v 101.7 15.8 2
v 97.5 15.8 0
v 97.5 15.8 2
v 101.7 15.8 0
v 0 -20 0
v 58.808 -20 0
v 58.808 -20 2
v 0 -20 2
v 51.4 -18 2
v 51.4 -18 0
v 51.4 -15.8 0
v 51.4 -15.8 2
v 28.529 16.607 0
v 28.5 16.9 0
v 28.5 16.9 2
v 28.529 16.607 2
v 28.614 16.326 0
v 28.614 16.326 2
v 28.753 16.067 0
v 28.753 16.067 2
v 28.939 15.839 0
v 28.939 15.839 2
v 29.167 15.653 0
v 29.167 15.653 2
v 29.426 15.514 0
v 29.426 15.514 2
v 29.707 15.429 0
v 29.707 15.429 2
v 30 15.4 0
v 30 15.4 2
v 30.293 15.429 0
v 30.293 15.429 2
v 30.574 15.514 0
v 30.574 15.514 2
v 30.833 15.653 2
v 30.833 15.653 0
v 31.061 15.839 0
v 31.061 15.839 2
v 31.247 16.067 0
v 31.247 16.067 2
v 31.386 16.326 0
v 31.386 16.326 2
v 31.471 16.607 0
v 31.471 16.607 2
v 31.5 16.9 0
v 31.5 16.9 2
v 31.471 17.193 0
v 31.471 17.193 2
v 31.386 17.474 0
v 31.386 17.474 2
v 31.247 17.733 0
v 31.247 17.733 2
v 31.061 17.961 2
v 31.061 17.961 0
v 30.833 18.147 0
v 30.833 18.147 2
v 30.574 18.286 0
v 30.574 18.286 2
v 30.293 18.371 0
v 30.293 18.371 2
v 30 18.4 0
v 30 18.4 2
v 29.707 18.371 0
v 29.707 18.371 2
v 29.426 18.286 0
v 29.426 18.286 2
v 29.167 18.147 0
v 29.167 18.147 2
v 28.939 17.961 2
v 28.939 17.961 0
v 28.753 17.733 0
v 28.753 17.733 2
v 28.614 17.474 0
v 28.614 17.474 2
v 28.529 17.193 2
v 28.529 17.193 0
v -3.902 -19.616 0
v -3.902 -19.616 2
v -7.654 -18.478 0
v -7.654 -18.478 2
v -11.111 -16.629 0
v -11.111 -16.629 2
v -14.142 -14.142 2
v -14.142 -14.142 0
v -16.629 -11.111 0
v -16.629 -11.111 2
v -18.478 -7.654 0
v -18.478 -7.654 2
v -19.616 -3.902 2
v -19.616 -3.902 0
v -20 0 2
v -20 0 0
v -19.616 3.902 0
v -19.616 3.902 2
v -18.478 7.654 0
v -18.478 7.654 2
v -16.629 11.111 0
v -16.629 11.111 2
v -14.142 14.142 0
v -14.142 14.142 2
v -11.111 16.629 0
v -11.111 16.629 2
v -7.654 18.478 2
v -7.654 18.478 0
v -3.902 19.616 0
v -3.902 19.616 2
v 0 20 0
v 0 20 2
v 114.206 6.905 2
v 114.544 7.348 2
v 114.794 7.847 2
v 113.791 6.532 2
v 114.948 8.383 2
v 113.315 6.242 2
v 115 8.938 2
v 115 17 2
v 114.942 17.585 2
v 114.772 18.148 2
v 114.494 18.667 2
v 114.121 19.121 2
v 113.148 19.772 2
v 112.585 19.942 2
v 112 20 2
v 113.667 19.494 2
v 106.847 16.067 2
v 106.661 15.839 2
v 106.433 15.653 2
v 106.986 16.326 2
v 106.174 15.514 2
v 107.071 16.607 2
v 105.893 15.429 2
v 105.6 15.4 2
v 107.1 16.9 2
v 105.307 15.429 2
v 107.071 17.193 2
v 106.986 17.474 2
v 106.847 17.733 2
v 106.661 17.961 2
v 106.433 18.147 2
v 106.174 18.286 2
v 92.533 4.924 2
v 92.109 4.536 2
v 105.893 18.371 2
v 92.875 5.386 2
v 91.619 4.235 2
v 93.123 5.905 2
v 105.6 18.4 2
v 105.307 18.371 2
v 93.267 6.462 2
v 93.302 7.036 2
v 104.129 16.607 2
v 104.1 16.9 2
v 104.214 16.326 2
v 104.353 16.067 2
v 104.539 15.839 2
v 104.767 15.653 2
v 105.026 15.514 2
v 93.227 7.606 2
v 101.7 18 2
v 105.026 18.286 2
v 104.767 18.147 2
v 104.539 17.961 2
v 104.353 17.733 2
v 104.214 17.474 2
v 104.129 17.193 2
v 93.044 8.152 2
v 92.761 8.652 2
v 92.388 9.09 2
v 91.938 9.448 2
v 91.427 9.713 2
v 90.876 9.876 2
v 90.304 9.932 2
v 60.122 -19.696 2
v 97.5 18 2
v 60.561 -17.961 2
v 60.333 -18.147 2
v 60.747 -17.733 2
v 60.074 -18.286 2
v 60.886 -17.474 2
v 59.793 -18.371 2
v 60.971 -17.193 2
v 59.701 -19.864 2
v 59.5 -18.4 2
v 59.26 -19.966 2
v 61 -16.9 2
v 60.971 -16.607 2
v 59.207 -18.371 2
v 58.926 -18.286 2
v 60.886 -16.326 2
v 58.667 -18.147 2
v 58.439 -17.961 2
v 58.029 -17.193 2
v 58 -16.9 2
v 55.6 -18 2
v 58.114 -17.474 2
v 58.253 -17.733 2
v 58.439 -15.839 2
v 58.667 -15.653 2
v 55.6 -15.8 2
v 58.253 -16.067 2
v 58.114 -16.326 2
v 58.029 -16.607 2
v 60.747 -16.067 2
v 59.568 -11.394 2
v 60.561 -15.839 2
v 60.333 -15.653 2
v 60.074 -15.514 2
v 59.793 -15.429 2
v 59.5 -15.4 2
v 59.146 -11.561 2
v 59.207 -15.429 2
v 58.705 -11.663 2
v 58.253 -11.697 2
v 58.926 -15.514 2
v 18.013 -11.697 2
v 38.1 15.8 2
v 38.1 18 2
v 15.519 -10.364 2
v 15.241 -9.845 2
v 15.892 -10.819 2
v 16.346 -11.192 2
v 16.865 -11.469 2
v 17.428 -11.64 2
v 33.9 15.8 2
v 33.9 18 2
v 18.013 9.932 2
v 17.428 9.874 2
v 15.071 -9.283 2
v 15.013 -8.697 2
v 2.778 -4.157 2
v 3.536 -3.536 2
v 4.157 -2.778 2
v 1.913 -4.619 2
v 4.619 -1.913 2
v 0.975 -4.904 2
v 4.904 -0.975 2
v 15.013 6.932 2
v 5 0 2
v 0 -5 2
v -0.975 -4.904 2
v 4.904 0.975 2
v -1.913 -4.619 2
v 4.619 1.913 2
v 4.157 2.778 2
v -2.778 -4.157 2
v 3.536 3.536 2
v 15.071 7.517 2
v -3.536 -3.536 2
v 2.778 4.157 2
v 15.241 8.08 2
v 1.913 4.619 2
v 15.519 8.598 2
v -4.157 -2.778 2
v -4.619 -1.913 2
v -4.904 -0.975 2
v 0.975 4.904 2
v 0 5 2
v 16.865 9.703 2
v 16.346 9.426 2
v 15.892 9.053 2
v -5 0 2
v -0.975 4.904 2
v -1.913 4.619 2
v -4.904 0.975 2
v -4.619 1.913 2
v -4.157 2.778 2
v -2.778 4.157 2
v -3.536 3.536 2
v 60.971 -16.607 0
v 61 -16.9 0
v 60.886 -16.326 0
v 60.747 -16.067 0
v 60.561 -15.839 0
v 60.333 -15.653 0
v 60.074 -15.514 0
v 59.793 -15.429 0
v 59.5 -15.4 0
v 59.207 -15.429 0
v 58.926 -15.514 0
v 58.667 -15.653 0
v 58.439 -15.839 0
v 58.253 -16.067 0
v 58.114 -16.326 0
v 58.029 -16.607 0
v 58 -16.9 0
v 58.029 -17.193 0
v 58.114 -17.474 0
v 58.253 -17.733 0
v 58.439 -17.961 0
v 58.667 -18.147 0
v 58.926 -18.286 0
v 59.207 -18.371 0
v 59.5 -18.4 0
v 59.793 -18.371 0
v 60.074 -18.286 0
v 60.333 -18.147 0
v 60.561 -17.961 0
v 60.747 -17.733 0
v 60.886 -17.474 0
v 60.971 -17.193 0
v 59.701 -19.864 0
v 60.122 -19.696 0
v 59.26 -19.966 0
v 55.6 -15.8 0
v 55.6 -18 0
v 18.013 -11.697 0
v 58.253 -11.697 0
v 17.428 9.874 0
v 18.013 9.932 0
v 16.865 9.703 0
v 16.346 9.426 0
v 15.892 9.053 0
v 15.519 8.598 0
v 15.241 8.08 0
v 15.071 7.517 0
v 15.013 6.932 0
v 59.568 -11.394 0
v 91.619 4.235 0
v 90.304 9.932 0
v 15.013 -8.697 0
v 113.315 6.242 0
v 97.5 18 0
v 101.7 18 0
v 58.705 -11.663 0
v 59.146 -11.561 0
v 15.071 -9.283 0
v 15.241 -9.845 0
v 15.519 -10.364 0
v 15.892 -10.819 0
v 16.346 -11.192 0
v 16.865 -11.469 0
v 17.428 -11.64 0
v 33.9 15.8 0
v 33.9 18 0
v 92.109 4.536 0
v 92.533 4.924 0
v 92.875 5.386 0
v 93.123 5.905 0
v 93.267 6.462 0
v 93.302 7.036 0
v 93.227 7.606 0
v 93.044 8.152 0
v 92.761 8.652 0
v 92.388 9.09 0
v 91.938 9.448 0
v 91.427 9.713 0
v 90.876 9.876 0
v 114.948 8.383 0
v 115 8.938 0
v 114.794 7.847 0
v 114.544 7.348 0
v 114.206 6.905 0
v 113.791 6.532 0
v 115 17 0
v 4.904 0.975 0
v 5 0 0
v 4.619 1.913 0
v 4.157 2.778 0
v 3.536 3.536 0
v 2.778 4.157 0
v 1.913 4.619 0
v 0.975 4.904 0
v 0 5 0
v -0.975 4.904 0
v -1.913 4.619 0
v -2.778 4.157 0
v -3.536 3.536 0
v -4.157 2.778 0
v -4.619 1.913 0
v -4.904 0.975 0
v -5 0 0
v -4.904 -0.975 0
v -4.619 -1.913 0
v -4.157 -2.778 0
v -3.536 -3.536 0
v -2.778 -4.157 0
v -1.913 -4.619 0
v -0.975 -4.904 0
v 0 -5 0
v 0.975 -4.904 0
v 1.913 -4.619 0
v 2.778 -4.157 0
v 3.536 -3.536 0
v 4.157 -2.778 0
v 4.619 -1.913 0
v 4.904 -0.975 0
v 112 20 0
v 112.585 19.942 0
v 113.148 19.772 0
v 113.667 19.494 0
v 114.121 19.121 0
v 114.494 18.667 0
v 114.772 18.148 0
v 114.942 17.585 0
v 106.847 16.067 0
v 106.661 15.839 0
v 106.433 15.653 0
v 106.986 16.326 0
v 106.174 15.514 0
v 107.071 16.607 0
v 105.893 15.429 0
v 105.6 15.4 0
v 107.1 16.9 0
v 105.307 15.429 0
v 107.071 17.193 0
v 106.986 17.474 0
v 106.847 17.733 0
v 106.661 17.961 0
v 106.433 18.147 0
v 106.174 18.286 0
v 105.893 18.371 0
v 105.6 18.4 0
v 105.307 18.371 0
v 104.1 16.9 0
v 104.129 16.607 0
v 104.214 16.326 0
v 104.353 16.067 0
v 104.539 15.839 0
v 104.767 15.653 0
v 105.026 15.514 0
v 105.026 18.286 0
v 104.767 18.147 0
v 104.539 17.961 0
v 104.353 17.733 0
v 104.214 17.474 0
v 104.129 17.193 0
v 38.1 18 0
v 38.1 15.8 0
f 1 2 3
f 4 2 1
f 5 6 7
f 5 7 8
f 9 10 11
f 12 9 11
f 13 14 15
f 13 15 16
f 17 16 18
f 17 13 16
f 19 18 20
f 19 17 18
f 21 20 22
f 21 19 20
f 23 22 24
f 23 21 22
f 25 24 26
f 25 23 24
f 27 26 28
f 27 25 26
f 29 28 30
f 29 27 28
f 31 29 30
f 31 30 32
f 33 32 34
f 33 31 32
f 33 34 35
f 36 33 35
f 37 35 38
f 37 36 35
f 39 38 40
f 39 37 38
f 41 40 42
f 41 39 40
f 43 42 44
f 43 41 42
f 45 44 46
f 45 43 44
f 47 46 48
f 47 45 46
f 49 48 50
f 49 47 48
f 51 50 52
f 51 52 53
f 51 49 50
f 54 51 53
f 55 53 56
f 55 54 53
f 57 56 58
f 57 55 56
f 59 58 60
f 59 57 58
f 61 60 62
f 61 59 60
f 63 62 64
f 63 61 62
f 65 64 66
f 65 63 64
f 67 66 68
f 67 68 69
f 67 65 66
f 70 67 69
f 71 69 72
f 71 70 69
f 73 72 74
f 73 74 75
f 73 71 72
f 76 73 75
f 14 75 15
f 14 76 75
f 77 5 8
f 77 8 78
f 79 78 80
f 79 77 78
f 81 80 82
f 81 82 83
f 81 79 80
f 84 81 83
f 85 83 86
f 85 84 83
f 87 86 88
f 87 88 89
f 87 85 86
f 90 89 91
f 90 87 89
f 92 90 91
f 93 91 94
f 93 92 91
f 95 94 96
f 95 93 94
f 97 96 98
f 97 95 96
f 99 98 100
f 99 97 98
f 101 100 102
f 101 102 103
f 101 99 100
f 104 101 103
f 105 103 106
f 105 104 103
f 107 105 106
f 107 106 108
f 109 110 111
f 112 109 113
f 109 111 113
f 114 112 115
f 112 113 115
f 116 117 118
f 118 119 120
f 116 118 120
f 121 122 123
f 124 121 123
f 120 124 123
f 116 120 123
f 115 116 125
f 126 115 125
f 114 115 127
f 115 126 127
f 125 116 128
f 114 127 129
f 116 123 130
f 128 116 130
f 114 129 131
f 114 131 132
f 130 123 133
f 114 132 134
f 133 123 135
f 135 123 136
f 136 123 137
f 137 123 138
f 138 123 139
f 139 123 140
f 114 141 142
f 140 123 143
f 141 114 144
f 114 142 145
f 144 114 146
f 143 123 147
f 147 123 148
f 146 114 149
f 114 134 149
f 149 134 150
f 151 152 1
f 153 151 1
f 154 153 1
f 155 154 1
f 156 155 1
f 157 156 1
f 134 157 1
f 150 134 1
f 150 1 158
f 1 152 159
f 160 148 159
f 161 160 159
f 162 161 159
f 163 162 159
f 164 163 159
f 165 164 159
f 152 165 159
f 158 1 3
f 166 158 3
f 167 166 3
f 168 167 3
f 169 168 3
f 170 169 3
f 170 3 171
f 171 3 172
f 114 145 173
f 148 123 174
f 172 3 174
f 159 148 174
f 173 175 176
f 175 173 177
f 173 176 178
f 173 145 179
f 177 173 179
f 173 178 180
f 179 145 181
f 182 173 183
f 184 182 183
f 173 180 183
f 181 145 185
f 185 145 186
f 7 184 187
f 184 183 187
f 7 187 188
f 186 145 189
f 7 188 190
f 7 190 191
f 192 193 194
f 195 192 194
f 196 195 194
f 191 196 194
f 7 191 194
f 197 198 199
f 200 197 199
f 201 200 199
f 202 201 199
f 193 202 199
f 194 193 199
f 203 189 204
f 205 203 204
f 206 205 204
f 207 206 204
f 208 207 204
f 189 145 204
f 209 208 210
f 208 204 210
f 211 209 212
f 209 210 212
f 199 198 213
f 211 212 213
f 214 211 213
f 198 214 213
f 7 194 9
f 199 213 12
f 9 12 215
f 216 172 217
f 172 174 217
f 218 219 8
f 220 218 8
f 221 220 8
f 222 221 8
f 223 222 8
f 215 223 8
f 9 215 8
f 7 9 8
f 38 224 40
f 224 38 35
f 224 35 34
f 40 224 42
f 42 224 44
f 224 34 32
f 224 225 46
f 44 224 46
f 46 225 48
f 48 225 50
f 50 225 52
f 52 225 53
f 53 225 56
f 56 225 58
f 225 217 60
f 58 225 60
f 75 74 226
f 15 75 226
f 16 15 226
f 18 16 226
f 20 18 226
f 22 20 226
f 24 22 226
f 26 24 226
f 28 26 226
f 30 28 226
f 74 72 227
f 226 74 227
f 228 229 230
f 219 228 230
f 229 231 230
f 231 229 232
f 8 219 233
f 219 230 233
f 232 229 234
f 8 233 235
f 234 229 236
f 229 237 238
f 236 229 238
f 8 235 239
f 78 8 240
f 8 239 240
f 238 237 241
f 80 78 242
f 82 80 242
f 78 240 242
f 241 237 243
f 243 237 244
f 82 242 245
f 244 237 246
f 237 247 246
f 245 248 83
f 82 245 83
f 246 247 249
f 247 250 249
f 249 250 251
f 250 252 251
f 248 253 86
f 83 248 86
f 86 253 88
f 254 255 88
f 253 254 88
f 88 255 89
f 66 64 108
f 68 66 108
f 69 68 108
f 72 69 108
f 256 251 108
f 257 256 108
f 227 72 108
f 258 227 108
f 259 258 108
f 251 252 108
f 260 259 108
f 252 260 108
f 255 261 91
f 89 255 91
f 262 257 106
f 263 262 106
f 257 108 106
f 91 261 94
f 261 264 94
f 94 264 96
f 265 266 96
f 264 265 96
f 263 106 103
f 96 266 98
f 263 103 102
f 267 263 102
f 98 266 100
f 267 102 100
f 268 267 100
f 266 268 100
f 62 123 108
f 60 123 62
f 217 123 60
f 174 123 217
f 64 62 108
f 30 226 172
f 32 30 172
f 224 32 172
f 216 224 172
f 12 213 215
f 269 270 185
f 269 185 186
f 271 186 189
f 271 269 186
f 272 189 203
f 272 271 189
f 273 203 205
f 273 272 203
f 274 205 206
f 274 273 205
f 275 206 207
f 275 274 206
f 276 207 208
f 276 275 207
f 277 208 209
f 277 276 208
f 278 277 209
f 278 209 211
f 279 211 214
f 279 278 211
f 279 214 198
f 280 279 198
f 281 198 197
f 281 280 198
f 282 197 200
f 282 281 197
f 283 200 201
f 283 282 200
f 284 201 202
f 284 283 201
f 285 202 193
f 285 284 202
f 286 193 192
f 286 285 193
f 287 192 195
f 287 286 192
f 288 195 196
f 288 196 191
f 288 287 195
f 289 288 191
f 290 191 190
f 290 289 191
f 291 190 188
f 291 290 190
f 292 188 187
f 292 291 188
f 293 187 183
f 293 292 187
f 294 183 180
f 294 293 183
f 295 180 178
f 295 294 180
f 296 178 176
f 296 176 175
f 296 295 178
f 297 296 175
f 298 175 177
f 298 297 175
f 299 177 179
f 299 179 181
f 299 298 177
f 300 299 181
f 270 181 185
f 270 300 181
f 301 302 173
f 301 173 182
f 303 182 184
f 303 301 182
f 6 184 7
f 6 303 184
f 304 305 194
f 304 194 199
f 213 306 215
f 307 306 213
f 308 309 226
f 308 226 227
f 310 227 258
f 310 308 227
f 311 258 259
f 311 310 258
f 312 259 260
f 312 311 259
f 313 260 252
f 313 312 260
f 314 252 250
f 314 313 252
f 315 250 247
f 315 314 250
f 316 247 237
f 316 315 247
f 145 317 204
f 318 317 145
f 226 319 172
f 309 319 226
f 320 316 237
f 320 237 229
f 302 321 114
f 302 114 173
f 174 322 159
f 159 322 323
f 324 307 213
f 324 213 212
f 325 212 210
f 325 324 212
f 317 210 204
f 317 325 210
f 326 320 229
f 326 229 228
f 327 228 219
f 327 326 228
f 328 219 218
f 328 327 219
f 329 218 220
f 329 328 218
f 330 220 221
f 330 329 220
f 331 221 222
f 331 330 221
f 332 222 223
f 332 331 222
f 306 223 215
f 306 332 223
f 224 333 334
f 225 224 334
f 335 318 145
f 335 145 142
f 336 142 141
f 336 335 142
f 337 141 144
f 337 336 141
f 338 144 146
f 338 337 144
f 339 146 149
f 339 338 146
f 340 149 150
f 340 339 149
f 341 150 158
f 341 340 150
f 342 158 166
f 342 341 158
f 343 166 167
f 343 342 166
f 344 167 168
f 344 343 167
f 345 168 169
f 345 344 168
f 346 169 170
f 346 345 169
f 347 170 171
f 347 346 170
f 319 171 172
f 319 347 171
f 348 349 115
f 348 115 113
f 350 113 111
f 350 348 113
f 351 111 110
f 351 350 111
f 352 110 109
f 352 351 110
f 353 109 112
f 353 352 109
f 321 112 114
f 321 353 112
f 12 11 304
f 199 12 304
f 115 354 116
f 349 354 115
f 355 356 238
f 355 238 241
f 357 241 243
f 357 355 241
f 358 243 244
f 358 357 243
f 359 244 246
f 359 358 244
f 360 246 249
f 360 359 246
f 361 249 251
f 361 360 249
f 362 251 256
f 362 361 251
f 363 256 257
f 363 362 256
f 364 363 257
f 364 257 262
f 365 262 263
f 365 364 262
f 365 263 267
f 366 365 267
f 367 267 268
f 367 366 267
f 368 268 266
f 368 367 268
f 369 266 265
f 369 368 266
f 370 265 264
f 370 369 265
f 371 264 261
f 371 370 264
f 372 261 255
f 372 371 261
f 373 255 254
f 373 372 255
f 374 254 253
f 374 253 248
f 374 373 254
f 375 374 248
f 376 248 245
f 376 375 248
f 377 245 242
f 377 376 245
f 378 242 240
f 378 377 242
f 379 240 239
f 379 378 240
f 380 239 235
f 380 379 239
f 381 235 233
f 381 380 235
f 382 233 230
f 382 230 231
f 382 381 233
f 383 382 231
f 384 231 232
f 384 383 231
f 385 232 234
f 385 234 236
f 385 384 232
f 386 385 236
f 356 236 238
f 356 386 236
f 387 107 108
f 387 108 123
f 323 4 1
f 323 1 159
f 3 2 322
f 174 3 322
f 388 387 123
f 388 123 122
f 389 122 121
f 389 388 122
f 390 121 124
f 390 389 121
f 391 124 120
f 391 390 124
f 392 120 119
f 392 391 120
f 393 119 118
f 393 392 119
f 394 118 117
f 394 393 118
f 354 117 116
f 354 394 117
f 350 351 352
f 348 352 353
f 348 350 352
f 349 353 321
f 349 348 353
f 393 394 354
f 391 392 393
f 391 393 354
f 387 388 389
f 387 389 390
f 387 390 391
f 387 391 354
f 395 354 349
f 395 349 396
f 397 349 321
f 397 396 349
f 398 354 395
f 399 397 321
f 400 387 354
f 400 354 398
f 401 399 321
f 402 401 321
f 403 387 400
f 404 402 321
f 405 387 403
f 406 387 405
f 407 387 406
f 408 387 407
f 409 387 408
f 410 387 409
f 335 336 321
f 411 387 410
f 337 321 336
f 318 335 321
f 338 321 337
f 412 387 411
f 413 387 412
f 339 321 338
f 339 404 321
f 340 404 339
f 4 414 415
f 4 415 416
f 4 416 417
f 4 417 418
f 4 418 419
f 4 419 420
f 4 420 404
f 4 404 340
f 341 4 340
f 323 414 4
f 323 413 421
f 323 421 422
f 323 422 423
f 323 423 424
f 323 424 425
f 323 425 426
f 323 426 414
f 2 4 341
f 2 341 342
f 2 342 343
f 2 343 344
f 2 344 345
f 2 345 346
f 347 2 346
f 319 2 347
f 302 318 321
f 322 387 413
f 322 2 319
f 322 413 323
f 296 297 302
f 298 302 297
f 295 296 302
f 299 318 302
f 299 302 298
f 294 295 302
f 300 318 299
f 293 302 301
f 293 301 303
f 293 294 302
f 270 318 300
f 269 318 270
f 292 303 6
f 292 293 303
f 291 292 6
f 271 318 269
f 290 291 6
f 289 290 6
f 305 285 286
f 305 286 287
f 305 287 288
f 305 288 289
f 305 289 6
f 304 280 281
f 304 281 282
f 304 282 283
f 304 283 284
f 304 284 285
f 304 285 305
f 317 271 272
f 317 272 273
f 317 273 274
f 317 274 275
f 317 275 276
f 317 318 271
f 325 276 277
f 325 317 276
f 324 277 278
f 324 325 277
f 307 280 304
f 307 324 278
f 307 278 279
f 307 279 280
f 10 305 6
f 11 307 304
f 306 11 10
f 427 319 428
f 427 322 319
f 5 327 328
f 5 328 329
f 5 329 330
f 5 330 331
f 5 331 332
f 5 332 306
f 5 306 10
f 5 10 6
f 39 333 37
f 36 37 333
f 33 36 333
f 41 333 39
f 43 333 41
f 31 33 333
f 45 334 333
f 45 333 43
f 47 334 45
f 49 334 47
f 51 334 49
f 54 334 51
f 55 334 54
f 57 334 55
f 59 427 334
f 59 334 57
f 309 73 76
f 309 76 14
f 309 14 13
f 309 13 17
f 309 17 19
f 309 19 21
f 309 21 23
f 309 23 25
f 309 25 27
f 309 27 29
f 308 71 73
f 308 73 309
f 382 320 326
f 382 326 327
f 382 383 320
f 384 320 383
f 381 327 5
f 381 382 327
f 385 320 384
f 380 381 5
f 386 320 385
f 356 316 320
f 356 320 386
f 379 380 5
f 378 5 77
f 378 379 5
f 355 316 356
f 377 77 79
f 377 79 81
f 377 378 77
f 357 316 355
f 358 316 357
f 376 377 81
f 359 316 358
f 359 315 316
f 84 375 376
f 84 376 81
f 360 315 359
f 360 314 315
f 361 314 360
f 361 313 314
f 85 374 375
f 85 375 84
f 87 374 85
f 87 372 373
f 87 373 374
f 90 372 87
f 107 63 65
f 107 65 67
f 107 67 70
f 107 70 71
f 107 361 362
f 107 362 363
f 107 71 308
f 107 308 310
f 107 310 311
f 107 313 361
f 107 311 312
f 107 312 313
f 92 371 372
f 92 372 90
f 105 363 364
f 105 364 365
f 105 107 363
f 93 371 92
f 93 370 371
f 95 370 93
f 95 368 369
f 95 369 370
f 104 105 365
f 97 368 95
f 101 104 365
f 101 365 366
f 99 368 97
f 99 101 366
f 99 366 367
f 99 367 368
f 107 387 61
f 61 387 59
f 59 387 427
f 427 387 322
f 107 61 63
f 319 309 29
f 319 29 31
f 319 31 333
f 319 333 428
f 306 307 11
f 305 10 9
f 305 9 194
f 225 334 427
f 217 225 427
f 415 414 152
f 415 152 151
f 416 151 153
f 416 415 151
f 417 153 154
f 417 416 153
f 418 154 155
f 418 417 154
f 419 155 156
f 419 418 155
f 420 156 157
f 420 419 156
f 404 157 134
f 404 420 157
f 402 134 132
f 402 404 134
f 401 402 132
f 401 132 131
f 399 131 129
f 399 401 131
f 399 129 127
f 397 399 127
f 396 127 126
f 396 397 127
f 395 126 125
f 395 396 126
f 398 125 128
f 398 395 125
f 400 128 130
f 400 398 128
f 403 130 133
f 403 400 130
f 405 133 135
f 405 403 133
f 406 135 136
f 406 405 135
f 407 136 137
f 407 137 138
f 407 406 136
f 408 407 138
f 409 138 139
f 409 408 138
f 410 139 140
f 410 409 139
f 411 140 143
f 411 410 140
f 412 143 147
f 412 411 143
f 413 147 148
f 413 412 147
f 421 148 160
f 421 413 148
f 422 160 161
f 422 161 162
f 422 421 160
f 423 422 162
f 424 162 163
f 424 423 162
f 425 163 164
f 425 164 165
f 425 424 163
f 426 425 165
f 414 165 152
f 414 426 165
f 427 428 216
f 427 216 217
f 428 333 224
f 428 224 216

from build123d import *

# Parameters (mm, degrees)
SKETCH_1_R      = 5
SKETCH_1_R_2    = 1.5
SKETCH_1_W      = 4.2
SKETCH_1_H      = 2.2
EXTRUDE_1_DEPTH = 2


with BuildPart() as part:
    # 草图1 → 凸台-拉伸1 (new body)
    with BuildSketch(Plane.XY):
        with BuildLine():
            Line((0, 20), (112, 20))
            ThreePointArc((112, 20), (114.121320344, 19.121320344), (115, 17))
            Line((115, 17), (115, 8.938182396))
            ThreePointArc((115, 8.938182396), (114.544077651, 7.348317965), (113.314887395, 6.241690019))
            Line((113.314887395, 6.241690019), (60.122415269, -19.696492377))
            ThreePointArc((60.122415269, -19.696492377), (59.482258513, -19.923138479), (58.807527874, -20))
            Line((58.807527874, -20), (0, -20))
            ThreePointArc((0, -20), (-20, 0), (0, 20))
        make_face()
        Circle(SKETCH_1_R, mode=Mode.SUBTRACT)
        with Locations(Location((30, 16.9, 0), (0, 0, 180))):
            Circle(SKETCH_1_R_2, mode=Mode.SUBTRACT)
        with Locations(Location((105.6, 16.9, 0), (0, 0, 180))):
            Circle(SKETCH_1_R_2, mode=Mode.SUBTRACT)
        with Locations((59.5, -16.9)):
            Circle(SKETCH_1_R_2, mode=Mode.SUBTRACT)
        with BuildLine():
            Line((59.567545449, -11.393906383), (91.618526066, 4.235075463))
            ThreePointArc((91.618526066, 4.235075463), (93.22677715, 7.606298478), (90.303638671, 9.93156784))
            Line((90.303638671, 9.93156784), (18.013127748, 9.93156784))
            ThreePointArc((18.013127748, 9.93156784), (15.891807404, 9.052888183), (15.013127748, 6.93156784))
            Line((15.013127748, 6.93156784), (15.013127748, -8.697414007))
            ThreePointArc((15.013127748, -8.697414007), (15.891807404, -10.81873435), (18.013127748, -11.697414007))
            Line((18.013127748, -11.697414007), (58.252658054, -11.697414007))
            ThreePointArc((58.252658054, -11.697414007), (58.927388693, -11.620552485), (59.567545449, -11.393906383))
        make_face(mode=Mode.SUBTRACT)
        with Locations((99.6, 16.9)):
            Rectangle(SKETCH_1_W, SKETCH_1_H, mode=Mode.SUBTRACT)
        with Locations((36, 16.9)):
            Rectangle(SKETCH_1_W, SKETCH_1_H, mode=Mode.SUBTRACT)
        with Locations((53.5, -16.9)):
            Rectangle(SKETCH_1_W, SKETCH_1_H, mode=Mode.SUBTRACT)
    extrude(amount=EXTRUDE_1_DEPTH)


solid = part.part
